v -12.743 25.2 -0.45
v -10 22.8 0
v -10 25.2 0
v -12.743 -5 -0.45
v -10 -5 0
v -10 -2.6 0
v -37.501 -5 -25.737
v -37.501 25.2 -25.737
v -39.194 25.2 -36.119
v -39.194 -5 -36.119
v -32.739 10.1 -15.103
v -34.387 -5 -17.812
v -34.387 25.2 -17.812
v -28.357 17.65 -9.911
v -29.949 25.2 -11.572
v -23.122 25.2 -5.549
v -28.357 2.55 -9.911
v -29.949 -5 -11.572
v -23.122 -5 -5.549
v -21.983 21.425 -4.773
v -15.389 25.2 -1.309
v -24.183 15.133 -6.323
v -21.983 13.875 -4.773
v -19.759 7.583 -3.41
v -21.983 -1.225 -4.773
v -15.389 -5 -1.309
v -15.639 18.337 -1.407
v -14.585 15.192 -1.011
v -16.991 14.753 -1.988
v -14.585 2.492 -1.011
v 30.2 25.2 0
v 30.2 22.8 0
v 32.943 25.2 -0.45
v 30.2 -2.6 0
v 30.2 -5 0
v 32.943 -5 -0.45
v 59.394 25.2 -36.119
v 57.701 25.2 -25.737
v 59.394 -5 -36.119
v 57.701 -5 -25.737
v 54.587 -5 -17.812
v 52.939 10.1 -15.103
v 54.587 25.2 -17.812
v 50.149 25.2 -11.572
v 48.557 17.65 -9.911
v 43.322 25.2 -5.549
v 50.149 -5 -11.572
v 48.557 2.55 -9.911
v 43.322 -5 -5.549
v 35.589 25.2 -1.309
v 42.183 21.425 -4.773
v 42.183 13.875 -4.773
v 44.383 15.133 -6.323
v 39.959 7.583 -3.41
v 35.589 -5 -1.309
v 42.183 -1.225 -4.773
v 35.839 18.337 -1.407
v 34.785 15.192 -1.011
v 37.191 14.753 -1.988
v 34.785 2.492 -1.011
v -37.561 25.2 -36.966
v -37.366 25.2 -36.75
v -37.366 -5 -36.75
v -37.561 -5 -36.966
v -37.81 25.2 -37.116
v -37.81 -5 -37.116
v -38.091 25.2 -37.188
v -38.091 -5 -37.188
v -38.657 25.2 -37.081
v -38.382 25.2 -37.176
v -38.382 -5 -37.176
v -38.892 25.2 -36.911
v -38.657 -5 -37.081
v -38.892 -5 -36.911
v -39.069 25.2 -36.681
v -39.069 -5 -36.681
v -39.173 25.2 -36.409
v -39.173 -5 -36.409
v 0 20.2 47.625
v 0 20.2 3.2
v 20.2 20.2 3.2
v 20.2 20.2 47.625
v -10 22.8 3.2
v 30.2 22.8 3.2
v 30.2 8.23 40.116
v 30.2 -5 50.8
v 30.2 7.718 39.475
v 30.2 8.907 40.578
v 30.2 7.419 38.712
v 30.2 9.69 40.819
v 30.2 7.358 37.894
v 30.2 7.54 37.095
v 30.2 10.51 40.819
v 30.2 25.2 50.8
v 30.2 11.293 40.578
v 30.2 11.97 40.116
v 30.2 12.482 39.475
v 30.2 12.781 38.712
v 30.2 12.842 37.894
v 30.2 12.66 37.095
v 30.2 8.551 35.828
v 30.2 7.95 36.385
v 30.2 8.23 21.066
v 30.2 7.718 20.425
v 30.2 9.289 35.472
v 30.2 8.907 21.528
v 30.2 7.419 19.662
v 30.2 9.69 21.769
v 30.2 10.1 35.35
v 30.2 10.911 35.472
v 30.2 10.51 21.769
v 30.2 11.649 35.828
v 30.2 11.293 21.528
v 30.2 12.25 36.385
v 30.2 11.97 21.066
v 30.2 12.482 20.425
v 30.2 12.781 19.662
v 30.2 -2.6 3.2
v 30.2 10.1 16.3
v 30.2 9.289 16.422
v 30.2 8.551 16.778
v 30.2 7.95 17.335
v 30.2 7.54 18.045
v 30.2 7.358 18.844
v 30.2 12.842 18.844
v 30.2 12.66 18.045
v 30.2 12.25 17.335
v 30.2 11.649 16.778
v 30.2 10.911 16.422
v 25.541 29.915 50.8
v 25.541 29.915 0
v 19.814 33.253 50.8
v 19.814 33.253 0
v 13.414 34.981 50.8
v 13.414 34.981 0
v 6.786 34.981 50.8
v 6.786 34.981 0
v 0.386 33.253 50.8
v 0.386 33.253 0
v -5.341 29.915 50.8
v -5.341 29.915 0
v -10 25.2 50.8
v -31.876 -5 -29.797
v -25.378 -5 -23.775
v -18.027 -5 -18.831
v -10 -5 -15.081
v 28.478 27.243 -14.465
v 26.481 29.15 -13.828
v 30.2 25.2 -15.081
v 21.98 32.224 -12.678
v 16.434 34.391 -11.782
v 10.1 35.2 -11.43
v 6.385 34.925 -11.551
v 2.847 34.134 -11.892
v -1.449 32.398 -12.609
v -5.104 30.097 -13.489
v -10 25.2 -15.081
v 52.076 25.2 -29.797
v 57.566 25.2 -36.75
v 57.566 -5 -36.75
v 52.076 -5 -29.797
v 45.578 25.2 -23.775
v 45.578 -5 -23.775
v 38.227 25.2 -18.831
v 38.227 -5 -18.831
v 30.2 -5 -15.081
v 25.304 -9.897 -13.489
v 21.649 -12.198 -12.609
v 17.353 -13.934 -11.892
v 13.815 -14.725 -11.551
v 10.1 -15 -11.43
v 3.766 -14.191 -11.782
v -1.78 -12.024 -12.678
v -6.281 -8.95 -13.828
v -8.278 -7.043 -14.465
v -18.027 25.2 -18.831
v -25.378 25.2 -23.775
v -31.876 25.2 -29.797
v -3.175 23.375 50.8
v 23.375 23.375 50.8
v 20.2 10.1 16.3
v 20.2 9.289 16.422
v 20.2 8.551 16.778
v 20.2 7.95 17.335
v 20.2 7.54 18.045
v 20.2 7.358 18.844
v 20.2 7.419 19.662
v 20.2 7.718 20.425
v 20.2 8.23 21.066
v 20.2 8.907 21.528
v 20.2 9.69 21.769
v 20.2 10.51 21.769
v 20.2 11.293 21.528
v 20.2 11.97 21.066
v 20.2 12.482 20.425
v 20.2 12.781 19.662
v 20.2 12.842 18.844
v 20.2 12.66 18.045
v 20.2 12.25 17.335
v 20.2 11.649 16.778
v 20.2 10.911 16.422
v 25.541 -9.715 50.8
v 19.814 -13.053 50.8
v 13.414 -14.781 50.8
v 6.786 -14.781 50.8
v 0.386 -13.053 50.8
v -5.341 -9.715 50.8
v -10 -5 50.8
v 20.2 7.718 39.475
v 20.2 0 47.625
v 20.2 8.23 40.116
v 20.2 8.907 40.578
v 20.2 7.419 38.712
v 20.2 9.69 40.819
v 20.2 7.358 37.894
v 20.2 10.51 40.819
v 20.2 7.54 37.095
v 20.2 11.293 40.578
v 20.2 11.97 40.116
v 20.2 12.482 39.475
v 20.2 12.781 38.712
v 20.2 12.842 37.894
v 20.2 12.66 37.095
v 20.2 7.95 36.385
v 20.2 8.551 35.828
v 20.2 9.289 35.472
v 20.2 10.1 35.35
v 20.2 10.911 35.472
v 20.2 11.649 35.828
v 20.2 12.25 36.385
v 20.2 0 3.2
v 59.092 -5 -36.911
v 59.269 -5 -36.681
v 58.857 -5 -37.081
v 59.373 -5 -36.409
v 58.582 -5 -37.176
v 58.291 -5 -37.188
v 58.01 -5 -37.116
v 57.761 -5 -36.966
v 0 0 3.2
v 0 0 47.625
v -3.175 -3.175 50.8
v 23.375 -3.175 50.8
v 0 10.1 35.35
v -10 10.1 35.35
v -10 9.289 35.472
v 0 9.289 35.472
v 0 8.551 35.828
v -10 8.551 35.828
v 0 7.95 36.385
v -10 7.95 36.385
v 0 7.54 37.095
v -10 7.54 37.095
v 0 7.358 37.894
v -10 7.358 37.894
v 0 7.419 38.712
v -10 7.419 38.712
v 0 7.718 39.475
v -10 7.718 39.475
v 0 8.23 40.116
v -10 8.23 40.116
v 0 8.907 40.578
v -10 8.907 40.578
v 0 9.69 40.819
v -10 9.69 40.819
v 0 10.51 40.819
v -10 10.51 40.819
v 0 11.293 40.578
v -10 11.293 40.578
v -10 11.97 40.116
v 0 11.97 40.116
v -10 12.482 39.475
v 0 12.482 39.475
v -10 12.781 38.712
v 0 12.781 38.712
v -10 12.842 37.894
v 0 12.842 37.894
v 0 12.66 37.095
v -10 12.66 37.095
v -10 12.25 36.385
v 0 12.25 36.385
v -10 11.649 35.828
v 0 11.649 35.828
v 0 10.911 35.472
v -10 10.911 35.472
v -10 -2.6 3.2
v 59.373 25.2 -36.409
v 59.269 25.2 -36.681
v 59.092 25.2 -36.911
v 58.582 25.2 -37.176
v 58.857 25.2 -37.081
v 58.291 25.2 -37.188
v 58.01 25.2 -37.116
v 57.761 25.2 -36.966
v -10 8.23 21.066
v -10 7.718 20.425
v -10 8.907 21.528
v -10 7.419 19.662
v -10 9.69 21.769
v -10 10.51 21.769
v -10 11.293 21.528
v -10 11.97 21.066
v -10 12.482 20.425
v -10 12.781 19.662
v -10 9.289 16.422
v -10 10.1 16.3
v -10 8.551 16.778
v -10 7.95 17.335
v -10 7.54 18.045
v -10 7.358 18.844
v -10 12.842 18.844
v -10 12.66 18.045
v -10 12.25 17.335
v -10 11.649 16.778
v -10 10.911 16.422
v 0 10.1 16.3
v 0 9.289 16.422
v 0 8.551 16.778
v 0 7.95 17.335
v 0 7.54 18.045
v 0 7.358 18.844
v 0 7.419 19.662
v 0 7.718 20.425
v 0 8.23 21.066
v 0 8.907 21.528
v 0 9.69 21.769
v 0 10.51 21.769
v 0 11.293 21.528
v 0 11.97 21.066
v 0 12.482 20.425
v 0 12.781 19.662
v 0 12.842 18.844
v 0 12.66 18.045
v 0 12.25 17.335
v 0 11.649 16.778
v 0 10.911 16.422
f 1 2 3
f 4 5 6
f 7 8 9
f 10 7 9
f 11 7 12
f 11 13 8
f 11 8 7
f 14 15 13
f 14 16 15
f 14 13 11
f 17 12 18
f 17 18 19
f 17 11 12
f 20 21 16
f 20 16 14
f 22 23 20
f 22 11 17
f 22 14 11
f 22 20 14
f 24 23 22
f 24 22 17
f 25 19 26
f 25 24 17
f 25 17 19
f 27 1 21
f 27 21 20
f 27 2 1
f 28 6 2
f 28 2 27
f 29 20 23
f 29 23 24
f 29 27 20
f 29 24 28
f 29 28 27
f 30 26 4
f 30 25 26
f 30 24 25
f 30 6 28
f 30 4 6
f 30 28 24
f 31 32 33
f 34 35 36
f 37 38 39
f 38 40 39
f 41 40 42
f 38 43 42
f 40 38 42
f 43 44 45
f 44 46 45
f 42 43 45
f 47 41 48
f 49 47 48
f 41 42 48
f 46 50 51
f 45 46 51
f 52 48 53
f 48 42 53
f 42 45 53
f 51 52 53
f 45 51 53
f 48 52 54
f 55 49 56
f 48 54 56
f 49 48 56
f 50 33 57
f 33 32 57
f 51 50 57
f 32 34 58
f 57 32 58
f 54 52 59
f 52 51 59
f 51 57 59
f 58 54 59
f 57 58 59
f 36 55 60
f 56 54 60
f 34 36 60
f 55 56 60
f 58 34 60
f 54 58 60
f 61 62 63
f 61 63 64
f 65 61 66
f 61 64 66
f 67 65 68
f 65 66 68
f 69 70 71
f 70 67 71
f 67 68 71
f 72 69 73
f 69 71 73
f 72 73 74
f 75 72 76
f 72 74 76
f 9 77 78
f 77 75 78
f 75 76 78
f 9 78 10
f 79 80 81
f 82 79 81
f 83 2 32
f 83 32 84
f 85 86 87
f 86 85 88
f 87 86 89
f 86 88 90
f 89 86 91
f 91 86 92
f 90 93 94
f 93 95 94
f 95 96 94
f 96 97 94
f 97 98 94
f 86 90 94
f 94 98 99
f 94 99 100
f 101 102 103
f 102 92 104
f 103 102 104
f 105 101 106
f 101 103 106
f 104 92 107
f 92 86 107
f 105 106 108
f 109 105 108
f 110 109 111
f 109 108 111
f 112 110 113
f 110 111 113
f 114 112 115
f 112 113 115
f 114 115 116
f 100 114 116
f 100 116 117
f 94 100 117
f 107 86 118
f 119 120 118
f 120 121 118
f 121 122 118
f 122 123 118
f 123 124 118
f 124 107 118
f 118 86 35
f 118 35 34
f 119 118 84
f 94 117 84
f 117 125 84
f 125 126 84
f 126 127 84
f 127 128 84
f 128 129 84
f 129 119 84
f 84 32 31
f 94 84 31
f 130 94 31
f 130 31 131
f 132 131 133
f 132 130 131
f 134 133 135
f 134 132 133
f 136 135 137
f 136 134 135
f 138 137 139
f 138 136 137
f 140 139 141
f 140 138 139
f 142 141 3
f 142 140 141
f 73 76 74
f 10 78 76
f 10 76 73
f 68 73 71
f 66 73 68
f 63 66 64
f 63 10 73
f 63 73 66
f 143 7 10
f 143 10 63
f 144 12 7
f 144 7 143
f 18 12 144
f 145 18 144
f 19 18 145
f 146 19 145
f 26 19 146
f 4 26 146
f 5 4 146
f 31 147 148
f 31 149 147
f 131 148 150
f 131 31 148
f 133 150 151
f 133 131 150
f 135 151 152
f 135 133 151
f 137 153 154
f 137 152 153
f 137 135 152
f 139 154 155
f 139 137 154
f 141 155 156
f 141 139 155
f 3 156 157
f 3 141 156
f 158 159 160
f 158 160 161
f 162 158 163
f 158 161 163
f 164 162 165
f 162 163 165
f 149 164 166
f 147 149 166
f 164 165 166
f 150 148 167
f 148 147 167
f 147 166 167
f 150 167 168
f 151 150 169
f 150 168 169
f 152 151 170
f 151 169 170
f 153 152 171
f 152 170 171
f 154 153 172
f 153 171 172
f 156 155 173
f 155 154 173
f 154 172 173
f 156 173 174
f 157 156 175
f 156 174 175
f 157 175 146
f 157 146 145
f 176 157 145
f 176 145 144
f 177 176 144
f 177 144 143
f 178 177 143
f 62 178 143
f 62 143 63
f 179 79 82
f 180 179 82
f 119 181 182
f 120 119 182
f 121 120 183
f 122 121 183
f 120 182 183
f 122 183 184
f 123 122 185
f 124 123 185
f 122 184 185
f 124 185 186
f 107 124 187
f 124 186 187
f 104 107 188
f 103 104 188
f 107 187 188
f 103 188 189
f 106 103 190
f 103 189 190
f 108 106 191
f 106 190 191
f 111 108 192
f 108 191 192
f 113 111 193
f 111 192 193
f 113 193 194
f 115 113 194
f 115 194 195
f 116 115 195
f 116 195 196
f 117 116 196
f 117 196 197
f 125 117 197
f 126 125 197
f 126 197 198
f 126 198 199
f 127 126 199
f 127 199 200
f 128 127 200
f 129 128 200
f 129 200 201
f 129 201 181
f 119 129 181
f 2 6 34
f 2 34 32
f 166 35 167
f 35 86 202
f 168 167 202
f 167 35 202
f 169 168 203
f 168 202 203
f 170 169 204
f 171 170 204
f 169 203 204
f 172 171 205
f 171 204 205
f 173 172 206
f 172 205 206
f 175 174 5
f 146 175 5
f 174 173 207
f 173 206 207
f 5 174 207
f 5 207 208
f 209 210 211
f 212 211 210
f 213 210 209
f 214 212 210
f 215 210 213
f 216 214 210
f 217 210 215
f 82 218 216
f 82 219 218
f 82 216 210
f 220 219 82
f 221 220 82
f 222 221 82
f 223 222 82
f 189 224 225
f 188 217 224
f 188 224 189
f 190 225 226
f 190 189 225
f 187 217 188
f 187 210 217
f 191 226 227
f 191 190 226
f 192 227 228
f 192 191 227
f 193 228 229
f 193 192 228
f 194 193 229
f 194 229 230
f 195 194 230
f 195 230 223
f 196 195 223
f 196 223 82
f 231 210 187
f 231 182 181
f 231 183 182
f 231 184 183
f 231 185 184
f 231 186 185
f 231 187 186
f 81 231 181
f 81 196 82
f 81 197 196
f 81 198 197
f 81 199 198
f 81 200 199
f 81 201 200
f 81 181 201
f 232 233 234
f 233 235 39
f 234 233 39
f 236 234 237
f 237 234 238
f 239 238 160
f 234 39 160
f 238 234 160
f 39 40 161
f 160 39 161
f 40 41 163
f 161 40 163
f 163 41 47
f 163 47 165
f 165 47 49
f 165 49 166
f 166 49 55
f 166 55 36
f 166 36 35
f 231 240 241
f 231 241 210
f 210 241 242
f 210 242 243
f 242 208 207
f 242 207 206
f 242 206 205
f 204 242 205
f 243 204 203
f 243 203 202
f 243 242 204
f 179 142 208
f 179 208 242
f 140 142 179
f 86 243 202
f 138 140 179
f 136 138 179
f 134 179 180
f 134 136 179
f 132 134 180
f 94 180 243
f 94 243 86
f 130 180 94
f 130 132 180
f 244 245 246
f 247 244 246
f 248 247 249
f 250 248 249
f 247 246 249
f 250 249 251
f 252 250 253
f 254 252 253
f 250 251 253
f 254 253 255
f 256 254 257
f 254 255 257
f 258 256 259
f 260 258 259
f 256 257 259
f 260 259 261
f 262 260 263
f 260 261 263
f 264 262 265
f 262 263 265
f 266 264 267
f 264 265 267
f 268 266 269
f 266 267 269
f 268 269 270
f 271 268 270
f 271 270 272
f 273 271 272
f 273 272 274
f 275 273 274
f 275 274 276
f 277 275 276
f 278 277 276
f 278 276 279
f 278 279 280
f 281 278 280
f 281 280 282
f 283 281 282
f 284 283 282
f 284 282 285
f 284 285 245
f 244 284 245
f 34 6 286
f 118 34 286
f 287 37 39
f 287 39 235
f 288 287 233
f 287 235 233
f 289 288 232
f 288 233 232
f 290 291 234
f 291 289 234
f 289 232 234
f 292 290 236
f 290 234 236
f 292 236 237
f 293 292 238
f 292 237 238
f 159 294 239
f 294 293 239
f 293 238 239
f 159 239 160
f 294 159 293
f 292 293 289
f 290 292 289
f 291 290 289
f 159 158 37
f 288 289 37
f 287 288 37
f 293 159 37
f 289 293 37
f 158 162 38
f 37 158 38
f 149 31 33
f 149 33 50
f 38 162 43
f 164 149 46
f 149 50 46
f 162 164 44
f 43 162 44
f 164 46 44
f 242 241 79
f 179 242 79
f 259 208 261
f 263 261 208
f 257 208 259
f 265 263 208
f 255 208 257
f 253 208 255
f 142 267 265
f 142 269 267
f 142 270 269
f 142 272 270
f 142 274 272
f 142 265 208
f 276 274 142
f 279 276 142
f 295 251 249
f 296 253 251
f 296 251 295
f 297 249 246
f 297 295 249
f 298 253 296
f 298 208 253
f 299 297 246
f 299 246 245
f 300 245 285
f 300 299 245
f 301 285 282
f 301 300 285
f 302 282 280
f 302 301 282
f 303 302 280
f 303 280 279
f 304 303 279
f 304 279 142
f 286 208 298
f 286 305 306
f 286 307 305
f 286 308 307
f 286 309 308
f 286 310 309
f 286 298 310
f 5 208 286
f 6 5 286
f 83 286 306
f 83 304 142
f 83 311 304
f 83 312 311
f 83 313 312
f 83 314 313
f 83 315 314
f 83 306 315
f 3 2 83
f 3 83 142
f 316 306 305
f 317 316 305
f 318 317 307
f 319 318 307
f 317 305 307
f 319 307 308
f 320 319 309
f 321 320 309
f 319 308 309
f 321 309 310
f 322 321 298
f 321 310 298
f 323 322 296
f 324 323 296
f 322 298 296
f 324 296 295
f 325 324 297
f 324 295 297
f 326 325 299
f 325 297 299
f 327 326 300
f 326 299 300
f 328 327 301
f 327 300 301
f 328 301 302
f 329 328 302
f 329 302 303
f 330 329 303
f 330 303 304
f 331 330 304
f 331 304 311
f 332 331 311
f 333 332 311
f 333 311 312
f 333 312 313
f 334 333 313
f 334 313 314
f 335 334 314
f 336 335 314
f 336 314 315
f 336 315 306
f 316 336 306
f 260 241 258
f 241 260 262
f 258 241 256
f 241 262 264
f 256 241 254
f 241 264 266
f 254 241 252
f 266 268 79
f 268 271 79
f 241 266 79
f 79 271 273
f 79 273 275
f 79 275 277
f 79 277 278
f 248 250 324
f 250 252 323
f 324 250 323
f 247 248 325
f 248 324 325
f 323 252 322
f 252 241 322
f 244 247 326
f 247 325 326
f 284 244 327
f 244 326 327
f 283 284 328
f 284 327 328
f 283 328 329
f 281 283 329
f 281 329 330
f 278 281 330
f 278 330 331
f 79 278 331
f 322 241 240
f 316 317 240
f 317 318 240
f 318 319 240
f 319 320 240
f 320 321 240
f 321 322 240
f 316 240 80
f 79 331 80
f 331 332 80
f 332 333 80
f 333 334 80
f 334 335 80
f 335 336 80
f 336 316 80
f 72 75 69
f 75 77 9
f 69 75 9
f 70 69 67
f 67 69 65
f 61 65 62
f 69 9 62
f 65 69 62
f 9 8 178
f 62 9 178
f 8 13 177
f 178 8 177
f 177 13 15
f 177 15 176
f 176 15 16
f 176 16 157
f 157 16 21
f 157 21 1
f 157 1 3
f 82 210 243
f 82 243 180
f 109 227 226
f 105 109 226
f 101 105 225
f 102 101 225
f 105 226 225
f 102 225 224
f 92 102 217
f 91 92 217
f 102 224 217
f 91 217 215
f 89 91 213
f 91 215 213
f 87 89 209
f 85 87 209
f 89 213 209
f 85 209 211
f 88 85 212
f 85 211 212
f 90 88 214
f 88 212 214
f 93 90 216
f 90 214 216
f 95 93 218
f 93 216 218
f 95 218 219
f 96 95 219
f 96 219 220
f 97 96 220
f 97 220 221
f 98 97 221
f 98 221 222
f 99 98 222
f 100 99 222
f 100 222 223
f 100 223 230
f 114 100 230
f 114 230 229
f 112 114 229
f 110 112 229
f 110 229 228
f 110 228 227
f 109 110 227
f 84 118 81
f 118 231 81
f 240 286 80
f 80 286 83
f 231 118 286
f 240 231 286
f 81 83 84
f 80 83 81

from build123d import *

# Parameters (mm, degrees)
SKETCH_1_W           = 40.2
SKETCH_1_H           = 30.2
SKETCH_1_W_2         = 20.2
SKETCH_1_H_2         = 20.2
EXTRUDE_1_DEPTH      = 50.8
EXTRUDE_2_DEPTH      = 10
EXTRUDE_2_DEPTH_BACK = 40.2
SKETCH_4_W           = 3.2
SKETCH_4_H           = 25.4
CUT_EXTRUDE_2_DEPTH  = 93.927513655
CHAMFER_1_SIZE       = 3.175
HOLE_WIZARD_M5_1_D   = 5.5
EXTRUDE_3_DEPTH      = 50.8
CUT_EXTRUDE_3_DEPTH  = 112.847190984


with BuildPart() as part:
    # 草图1 → 凸台-拉伸1 (new body)
    with BuildSketch(Plane.XY):
        with Locations((10.1, 10.1)):
            Rectangle(SKETCH_1_W, SKETCH_1_H)
        with Locations((10.1, 10.1)):
            Rectangle(SKETCH_1_W_2, SKETCH_1_H_2, mode=Mode.SUBTRACT)
    extrude(amount=EXTRUDE_1_DEPTH)

    # 草图3 → 凸台-拉伸2 (add, two sides: drawn at the far end of the back side and taken through both)
    with BuildSketch(Plane(origin=(0, 25.2, 0), x_dir=(1, 0, 0), z_dir=(0, 1, 0)).offset(-EXTRUDE_2_DEPTH_BACK)):
        with BuildLine():
            Line((-10, 0), (30.2, 0))
            add(Edge.make_bspline(
                [(30.2, 0), (36.683134474, 0.377878079), (55.880340128, 11.98777216), (58.933962636, 29.945985381), (59.393514037, 36.119152658)],
                knots=[0, 0, 0, 0, 0.46638288, 0.846265587, 0.846265587, 0.846265587, 0.846265587], degree=3))
            ThreePointArc((59.393514037, 36.119152658), (58.722687502, 37.138617507), (57.565727076, 36.75034004))
            ThreePointArc((57.565727076, 36.75034004), (10.1, 11.43), (-37.365727076, 36.75034004))
            ThreePointArc((-37.365727076, 36.75034004), (-38.522687502, 37.138617507), (-39.193514037, 36.119152658))
            add(Edge.make_bspline(
                [(-10, 0), (-16.483134474, 0.377878079), (-35.680340128, 11.98777216), (-38.733962636, 29.945985381), (-39.193514037, 36.119152658)],
                knots=[0, 0, 0, 0, 0.46638288, 0.846265587, 0.846265587, 0.846265587, 0.846265587], degree=3))
        make_face()
    extrude(amount=EXTRUDE_2_DEPTH + EXTRUDE_2_DEPTH_BACK)

    # 草图4 → 切除-拉伸2 (cut, through all)
    with BuildSketch(Plane.ZY.offset(10)):
        with Locations((1.6, 10.1)):
            Rectangle(SKETCH_4_W, SKETCH_4_H)
    extrude(amount=-CUT_EXTRUDE_2_DEPTH, mode=Mode.SUBTRACT)

    # 倒角1
    chamfer_1_edges = [part.edges().sort_by_distance(p)[0] for p in [
        (20.2, 10.1, 50.8),
        (10.1, 0, 50.8),
        (0, 10.1, 50.8),
        (10.1, 20.2, 50.8),
    ]]
    chamfer(chamfer_1_edges, length=CHAMFER_1_SIZE)

    # M5 间隙孔1 (through all)
    with Locations(Plane(origin=(30.2, 10.1, 38.1), x_dir=(0, 0, 1), z_dir=(1, 0, 0))):
        with Locations((0, 0), (-19.05, 0)):
            Hole(HOLE_WIZARD_M5_1_D / 2)

    # 草图12 → 凸台-拉伸3 (add)
    with BuildSketch(Plane.XY.offset(50.8)):
        with BuildLine():
            Line((-10, 25.2), (30.2, 25.2))
            ThreePointArc((30.2, 25.2), (10.1, 35.2), (-10, 25.2))
        make_face()
        with BuildLine():
            Line((-10, -5), (30.2, -5))
            ThreePointArc((30.2, -5), (10.1, -15), (-10, -5))
        make_face()
    extrude(amount=-EXTRUDE_3_DEPTH)

    # 草图14 → 切除-拉伸3 (cut, through all)
    with BuildSketch(Plane.XY.offset(50.8)):
        with BuildLine():
            Line((-53.451610889, 25.2), (-10, 25.2))
            ThreePointArc((-10, 25.2), (-1.125083519, 32.561917872), (10.1, 35.2))
            Line((10.1, 35.2), (-53.451610889, 35.2))
            Line((-53.451610889, 35.2), (-53.451610889, 25.2))
        make_face()
        with BuildLine():
            Line((73.651610889, 35.2), (10.1, 35.2))
            ThreePointArc((10.1, 35.2), (21.325083519, 32.561917872), (30.2, 25.2))
            Line((30.2, 25.2), (73.651610889, 25.2))
            Line((73.651610889, 25.2), (73.651610889, 35.2))
        make_face()
        with BuildLine():
            ThreePointArc((10.1, -15), (-1.125083519, -12.361917872), (-10, -5))
            Line((-10, -5), (-53.451610889, -5))
            Line((-53.451610889, -5), (-53.451610889, -15))
            Line((-53.451610889, -15), (10.1, -15))
        make_face()
        with BuildLine():
            ThreePointArc((30.2, -5), (21.325083519, -12.361917872), (10.1, -15))
            Line((10.1, -15), (73.651610889, -15))
            Line((73.651610889, -15), (73.651610889, -5))
            Line((73.651610889, -5), (30.2, -5))
        make_face()
    extrude(amount=-CUT_EXTRUDE_3_DEPTH, mode=Mode.SUBTRACT)


solid = part.part
